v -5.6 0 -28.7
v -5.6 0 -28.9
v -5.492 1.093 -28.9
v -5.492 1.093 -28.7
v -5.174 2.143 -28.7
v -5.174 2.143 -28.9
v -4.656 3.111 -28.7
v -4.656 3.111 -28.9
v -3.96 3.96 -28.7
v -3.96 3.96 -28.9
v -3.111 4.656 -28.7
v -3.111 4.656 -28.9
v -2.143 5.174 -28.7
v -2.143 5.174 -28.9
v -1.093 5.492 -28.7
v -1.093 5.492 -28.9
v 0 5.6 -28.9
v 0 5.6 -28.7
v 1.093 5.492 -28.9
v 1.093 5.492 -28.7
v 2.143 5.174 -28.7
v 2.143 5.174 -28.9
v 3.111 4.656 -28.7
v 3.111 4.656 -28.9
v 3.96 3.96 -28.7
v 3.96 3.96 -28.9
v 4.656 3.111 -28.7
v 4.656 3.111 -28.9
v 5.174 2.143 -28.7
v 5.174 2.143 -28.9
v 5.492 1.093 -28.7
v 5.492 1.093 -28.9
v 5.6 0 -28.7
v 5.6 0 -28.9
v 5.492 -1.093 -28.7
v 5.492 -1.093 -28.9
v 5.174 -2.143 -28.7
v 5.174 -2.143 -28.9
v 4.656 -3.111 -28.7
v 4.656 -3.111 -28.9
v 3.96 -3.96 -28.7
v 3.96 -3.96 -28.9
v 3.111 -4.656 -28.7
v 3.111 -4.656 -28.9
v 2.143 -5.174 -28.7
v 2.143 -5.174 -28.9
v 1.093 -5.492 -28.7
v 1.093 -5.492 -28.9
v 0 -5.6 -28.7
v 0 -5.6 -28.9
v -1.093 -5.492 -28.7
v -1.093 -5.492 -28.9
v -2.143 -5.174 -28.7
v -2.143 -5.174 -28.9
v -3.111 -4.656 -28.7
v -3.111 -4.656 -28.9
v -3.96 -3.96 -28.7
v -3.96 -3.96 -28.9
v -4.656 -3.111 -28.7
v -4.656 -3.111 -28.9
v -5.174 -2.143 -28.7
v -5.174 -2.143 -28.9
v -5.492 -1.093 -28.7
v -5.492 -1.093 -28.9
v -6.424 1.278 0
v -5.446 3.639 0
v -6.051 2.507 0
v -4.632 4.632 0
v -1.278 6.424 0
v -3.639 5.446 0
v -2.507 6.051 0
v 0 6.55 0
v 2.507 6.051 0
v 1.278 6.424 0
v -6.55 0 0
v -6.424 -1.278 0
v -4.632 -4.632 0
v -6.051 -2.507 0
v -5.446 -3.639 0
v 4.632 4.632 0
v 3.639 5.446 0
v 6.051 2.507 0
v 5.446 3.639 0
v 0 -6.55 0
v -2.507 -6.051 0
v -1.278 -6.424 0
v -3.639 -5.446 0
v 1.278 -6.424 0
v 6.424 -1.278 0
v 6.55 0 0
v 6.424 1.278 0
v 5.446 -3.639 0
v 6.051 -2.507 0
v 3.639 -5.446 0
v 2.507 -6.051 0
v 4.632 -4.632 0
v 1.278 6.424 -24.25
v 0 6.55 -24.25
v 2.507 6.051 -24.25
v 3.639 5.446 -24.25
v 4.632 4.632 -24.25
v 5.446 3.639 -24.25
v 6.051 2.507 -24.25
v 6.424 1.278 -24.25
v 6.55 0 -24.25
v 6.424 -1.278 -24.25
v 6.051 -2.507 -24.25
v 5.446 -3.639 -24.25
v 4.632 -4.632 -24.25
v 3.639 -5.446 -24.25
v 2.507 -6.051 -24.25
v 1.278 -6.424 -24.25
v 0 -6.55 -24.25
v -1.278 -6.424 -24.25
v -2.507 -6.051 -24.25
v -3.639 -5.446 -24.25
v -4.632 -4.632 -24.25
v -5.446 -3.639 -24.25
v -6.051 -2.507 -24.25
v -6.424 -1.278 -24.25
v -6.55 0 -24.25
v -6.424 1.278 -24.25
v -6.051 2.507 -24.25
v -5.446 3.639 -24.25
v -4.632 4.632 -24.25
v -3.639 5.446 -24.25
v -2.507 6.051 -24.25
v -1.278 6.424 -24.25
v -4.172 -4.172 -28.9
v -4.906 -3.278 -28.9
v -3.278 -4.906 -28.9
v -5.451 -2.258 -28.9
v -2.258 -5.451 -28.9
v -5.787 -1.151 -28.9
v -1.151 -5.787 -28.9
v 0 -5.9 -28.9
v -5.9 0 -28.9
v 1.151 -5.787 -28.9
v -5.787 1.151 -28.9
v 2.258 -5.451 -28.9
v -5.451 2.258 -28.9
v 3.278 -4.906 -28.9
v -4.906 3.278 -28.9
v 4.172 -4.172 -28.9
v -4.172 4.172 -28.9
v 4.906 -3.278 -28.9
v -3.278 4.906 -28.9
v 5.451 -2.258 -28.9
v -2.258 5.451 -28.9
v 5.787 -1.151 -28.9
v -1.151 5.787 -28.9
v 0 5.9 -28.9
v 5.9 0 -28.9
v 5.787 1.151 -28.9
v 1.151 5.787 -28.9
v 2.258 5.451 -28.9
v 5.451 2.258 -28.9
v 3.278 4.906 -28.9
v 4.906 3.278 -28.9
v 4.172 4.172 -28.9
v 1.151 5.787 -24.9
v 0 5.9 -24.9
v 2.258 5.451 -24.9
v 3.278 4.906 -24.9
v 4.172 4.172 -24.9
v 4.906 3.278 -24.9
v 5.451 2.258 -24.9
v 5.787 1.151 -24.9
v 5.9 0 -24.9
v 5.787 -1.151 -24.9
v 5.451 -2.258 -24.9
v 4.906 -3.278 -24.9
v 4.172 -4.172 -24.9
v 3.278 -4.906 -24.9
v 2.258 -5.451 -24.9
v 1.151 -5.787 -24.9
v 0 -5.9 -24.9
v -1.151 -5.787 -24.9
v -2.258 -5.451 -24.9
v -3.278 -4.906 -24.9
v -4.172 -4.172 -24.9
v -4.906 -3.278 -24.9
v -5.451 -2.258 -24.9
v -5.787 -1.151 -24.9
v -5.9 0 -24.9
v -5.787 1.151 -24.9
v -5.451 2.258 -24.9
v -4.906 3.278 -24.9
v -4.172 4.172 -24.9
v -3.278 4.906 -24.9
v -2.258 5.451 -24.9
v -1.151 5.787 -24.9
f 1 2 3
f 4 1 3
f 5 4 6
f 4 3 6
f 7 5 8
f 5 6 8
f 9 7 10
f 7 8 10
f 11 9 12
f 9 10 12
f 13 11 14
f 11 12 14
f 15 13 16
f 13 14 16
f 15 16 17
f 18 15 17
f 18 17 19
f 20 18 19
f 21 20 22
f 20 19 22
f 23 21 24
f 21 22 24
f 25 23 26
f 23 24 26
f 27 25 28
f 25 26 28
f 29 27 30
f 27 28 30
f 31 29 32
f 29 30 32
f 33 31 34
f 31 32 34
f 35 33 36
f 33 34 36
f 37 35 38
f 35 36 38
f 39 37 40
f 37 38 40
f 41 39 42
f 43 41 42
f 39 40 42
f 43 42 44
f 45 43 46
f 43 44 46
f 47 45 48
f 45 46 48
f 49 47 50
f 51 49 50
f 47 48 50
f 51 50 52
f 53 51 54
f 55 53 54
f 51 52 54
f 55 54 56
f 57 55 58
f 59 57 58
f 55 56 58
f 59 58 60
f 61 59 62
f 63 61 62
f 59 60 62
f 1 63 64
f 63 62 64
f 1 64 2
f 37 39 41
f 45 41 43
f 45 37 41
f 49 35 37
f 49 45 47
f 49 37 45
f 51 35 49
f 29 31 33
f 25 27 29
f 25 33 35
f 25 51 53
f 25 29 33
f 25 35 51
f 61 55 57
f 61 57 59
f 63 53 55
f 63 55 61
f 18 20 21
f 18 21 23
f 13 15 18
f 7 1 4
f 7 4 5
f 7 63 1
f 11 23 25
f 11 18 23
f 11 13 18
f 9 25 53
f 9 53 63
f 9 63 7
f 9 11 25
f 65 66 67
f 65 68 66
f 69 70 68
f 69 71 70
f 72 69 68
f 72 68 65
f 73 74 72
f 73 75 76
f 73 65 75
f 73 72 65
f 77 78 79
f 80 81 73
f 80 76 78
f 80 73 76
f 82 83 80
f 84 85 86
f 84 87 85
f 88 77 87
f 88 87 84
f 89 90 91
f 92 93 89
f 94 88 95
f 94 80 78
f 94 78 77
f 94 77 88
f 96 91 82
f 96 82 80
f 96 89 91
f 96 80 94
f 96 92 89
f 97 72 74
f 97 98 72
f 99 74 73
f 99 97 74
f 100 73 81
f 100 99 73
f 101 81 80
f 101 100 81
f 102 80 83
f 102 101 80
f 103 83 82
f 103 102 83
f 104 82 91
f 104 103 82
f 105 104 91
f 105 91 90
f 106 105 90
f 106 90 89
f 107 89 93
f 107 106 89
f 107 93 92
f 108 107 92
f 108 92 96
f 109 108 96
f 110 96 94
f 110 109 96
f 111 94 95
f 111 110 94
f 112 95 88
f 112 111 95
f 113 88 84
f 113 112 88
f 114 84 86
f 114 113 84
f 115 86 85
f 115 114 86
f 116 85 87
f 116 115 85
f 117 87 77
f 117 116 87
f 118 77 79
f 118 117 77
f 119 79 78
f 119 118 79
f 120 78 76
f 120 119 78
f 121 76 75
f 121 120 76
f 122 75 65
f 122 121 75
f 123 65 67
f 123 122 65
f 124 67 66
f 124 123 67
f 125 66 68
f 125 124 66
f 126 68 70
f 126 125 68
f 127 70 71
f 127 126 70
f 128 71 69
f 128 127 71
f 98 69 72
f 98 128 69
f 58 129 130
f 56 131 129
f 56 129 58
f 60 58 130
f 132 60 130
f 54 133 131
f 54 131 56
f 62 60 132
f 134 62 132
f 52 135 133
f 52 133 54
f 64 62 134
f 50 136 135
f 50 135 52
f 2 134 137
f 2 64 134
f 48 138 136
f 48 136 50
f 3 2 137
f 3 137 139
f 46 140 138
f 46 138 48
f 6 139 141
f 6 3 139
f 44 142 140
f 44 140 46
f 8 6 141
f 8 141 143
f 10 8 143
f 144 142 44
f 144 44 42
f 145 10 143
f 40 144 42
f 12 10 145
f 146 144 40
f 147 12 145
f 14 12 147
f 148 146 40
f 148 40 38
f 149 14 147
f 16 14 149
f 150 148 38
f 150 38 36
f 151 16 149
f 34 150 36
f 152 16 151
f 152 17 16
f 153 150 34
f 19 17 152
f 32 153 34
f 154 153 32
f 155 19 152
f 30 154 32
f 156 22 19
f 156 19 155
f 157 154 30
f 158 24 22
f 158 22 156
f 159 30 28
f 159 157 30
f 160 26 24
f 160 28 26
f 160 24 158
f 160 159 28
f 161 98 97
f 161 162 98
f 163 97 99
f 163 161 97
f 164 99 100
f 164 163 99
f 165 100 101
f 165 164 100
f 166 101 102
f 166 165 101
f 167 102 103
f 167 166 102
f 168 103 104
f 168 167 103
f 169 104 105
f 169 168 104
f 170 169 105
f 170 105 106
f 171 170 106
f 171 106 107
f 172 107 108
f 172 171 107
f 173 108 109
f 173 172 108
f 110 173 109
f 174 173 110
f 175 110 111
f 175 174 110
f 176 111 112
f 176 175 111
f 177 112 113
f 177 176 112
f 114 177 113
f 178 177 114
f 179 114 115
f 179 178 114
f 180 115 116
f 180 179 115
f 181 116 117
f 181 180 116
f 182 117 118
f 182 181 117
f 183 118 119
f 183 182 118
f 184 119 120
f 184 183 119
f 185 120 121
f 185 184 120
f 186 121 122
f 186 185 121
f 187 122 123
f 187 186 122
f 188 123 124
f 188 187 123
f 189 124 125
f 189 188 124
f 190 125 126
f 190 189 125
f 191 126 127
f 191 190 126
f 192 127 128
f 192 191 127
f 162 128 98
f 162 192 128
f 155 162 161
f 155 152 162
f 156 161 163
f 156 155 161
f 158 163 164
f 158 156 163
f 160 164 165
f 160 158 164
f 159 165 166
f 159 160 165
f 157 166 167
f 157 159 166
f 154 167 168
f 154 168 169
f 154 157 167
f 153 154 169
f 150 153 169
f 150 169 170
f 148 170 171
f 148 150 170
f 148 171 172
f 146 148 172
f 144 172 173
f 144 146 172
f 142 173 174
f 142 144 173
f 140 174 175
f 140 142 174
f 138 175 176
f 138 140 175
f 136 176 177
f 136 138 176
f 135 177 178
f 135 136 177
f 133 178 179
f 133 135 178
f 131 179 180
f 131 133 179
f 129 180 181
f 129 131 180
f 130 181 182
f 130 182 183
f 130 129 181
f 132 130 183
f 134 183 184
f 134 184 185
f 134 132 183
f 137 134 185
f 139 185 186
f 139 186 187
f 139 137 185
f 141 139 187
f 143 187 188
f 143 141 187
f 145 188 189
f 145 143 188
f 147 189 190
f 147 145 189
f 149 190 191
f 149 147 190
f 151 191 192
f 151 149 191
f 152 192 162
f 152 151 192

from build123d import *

# Parameters (mm, degrees)
SKETCH2_R          = 5.6
CUT_EXTRUDE1_DEPTH = 0.2


with BuildPart() as part:
    # Sketch1 → Revolve1 (revolve)
    with BuildSketch(Plane(origin=(0, 0, 0), x_dir=(0, 0, -1), z_dir=(1, 0, 0))):
        Polygon((0, 0), (0, 6.55), (24.25, 6.55), (24.9, 5.9), (28.9, 5.9), (28.9, 0), align=None)
    revolve(axis=Axis((0, 0, 0), (0, 0, -1)))

    # Sketch2 → Cut-Extrude1 (cut)
    with BuildSketch(Plane(origin=(0, 0, -28.9), x_dir=(-1, 0, 0), z_dir=(0, 0, -1))):
        Circle(SKETCH2_R)
    extrude(amount=-CUT_EXTRUDE1_DEPTH, mode=Mode.SUBTRACT)


solid = part.part
